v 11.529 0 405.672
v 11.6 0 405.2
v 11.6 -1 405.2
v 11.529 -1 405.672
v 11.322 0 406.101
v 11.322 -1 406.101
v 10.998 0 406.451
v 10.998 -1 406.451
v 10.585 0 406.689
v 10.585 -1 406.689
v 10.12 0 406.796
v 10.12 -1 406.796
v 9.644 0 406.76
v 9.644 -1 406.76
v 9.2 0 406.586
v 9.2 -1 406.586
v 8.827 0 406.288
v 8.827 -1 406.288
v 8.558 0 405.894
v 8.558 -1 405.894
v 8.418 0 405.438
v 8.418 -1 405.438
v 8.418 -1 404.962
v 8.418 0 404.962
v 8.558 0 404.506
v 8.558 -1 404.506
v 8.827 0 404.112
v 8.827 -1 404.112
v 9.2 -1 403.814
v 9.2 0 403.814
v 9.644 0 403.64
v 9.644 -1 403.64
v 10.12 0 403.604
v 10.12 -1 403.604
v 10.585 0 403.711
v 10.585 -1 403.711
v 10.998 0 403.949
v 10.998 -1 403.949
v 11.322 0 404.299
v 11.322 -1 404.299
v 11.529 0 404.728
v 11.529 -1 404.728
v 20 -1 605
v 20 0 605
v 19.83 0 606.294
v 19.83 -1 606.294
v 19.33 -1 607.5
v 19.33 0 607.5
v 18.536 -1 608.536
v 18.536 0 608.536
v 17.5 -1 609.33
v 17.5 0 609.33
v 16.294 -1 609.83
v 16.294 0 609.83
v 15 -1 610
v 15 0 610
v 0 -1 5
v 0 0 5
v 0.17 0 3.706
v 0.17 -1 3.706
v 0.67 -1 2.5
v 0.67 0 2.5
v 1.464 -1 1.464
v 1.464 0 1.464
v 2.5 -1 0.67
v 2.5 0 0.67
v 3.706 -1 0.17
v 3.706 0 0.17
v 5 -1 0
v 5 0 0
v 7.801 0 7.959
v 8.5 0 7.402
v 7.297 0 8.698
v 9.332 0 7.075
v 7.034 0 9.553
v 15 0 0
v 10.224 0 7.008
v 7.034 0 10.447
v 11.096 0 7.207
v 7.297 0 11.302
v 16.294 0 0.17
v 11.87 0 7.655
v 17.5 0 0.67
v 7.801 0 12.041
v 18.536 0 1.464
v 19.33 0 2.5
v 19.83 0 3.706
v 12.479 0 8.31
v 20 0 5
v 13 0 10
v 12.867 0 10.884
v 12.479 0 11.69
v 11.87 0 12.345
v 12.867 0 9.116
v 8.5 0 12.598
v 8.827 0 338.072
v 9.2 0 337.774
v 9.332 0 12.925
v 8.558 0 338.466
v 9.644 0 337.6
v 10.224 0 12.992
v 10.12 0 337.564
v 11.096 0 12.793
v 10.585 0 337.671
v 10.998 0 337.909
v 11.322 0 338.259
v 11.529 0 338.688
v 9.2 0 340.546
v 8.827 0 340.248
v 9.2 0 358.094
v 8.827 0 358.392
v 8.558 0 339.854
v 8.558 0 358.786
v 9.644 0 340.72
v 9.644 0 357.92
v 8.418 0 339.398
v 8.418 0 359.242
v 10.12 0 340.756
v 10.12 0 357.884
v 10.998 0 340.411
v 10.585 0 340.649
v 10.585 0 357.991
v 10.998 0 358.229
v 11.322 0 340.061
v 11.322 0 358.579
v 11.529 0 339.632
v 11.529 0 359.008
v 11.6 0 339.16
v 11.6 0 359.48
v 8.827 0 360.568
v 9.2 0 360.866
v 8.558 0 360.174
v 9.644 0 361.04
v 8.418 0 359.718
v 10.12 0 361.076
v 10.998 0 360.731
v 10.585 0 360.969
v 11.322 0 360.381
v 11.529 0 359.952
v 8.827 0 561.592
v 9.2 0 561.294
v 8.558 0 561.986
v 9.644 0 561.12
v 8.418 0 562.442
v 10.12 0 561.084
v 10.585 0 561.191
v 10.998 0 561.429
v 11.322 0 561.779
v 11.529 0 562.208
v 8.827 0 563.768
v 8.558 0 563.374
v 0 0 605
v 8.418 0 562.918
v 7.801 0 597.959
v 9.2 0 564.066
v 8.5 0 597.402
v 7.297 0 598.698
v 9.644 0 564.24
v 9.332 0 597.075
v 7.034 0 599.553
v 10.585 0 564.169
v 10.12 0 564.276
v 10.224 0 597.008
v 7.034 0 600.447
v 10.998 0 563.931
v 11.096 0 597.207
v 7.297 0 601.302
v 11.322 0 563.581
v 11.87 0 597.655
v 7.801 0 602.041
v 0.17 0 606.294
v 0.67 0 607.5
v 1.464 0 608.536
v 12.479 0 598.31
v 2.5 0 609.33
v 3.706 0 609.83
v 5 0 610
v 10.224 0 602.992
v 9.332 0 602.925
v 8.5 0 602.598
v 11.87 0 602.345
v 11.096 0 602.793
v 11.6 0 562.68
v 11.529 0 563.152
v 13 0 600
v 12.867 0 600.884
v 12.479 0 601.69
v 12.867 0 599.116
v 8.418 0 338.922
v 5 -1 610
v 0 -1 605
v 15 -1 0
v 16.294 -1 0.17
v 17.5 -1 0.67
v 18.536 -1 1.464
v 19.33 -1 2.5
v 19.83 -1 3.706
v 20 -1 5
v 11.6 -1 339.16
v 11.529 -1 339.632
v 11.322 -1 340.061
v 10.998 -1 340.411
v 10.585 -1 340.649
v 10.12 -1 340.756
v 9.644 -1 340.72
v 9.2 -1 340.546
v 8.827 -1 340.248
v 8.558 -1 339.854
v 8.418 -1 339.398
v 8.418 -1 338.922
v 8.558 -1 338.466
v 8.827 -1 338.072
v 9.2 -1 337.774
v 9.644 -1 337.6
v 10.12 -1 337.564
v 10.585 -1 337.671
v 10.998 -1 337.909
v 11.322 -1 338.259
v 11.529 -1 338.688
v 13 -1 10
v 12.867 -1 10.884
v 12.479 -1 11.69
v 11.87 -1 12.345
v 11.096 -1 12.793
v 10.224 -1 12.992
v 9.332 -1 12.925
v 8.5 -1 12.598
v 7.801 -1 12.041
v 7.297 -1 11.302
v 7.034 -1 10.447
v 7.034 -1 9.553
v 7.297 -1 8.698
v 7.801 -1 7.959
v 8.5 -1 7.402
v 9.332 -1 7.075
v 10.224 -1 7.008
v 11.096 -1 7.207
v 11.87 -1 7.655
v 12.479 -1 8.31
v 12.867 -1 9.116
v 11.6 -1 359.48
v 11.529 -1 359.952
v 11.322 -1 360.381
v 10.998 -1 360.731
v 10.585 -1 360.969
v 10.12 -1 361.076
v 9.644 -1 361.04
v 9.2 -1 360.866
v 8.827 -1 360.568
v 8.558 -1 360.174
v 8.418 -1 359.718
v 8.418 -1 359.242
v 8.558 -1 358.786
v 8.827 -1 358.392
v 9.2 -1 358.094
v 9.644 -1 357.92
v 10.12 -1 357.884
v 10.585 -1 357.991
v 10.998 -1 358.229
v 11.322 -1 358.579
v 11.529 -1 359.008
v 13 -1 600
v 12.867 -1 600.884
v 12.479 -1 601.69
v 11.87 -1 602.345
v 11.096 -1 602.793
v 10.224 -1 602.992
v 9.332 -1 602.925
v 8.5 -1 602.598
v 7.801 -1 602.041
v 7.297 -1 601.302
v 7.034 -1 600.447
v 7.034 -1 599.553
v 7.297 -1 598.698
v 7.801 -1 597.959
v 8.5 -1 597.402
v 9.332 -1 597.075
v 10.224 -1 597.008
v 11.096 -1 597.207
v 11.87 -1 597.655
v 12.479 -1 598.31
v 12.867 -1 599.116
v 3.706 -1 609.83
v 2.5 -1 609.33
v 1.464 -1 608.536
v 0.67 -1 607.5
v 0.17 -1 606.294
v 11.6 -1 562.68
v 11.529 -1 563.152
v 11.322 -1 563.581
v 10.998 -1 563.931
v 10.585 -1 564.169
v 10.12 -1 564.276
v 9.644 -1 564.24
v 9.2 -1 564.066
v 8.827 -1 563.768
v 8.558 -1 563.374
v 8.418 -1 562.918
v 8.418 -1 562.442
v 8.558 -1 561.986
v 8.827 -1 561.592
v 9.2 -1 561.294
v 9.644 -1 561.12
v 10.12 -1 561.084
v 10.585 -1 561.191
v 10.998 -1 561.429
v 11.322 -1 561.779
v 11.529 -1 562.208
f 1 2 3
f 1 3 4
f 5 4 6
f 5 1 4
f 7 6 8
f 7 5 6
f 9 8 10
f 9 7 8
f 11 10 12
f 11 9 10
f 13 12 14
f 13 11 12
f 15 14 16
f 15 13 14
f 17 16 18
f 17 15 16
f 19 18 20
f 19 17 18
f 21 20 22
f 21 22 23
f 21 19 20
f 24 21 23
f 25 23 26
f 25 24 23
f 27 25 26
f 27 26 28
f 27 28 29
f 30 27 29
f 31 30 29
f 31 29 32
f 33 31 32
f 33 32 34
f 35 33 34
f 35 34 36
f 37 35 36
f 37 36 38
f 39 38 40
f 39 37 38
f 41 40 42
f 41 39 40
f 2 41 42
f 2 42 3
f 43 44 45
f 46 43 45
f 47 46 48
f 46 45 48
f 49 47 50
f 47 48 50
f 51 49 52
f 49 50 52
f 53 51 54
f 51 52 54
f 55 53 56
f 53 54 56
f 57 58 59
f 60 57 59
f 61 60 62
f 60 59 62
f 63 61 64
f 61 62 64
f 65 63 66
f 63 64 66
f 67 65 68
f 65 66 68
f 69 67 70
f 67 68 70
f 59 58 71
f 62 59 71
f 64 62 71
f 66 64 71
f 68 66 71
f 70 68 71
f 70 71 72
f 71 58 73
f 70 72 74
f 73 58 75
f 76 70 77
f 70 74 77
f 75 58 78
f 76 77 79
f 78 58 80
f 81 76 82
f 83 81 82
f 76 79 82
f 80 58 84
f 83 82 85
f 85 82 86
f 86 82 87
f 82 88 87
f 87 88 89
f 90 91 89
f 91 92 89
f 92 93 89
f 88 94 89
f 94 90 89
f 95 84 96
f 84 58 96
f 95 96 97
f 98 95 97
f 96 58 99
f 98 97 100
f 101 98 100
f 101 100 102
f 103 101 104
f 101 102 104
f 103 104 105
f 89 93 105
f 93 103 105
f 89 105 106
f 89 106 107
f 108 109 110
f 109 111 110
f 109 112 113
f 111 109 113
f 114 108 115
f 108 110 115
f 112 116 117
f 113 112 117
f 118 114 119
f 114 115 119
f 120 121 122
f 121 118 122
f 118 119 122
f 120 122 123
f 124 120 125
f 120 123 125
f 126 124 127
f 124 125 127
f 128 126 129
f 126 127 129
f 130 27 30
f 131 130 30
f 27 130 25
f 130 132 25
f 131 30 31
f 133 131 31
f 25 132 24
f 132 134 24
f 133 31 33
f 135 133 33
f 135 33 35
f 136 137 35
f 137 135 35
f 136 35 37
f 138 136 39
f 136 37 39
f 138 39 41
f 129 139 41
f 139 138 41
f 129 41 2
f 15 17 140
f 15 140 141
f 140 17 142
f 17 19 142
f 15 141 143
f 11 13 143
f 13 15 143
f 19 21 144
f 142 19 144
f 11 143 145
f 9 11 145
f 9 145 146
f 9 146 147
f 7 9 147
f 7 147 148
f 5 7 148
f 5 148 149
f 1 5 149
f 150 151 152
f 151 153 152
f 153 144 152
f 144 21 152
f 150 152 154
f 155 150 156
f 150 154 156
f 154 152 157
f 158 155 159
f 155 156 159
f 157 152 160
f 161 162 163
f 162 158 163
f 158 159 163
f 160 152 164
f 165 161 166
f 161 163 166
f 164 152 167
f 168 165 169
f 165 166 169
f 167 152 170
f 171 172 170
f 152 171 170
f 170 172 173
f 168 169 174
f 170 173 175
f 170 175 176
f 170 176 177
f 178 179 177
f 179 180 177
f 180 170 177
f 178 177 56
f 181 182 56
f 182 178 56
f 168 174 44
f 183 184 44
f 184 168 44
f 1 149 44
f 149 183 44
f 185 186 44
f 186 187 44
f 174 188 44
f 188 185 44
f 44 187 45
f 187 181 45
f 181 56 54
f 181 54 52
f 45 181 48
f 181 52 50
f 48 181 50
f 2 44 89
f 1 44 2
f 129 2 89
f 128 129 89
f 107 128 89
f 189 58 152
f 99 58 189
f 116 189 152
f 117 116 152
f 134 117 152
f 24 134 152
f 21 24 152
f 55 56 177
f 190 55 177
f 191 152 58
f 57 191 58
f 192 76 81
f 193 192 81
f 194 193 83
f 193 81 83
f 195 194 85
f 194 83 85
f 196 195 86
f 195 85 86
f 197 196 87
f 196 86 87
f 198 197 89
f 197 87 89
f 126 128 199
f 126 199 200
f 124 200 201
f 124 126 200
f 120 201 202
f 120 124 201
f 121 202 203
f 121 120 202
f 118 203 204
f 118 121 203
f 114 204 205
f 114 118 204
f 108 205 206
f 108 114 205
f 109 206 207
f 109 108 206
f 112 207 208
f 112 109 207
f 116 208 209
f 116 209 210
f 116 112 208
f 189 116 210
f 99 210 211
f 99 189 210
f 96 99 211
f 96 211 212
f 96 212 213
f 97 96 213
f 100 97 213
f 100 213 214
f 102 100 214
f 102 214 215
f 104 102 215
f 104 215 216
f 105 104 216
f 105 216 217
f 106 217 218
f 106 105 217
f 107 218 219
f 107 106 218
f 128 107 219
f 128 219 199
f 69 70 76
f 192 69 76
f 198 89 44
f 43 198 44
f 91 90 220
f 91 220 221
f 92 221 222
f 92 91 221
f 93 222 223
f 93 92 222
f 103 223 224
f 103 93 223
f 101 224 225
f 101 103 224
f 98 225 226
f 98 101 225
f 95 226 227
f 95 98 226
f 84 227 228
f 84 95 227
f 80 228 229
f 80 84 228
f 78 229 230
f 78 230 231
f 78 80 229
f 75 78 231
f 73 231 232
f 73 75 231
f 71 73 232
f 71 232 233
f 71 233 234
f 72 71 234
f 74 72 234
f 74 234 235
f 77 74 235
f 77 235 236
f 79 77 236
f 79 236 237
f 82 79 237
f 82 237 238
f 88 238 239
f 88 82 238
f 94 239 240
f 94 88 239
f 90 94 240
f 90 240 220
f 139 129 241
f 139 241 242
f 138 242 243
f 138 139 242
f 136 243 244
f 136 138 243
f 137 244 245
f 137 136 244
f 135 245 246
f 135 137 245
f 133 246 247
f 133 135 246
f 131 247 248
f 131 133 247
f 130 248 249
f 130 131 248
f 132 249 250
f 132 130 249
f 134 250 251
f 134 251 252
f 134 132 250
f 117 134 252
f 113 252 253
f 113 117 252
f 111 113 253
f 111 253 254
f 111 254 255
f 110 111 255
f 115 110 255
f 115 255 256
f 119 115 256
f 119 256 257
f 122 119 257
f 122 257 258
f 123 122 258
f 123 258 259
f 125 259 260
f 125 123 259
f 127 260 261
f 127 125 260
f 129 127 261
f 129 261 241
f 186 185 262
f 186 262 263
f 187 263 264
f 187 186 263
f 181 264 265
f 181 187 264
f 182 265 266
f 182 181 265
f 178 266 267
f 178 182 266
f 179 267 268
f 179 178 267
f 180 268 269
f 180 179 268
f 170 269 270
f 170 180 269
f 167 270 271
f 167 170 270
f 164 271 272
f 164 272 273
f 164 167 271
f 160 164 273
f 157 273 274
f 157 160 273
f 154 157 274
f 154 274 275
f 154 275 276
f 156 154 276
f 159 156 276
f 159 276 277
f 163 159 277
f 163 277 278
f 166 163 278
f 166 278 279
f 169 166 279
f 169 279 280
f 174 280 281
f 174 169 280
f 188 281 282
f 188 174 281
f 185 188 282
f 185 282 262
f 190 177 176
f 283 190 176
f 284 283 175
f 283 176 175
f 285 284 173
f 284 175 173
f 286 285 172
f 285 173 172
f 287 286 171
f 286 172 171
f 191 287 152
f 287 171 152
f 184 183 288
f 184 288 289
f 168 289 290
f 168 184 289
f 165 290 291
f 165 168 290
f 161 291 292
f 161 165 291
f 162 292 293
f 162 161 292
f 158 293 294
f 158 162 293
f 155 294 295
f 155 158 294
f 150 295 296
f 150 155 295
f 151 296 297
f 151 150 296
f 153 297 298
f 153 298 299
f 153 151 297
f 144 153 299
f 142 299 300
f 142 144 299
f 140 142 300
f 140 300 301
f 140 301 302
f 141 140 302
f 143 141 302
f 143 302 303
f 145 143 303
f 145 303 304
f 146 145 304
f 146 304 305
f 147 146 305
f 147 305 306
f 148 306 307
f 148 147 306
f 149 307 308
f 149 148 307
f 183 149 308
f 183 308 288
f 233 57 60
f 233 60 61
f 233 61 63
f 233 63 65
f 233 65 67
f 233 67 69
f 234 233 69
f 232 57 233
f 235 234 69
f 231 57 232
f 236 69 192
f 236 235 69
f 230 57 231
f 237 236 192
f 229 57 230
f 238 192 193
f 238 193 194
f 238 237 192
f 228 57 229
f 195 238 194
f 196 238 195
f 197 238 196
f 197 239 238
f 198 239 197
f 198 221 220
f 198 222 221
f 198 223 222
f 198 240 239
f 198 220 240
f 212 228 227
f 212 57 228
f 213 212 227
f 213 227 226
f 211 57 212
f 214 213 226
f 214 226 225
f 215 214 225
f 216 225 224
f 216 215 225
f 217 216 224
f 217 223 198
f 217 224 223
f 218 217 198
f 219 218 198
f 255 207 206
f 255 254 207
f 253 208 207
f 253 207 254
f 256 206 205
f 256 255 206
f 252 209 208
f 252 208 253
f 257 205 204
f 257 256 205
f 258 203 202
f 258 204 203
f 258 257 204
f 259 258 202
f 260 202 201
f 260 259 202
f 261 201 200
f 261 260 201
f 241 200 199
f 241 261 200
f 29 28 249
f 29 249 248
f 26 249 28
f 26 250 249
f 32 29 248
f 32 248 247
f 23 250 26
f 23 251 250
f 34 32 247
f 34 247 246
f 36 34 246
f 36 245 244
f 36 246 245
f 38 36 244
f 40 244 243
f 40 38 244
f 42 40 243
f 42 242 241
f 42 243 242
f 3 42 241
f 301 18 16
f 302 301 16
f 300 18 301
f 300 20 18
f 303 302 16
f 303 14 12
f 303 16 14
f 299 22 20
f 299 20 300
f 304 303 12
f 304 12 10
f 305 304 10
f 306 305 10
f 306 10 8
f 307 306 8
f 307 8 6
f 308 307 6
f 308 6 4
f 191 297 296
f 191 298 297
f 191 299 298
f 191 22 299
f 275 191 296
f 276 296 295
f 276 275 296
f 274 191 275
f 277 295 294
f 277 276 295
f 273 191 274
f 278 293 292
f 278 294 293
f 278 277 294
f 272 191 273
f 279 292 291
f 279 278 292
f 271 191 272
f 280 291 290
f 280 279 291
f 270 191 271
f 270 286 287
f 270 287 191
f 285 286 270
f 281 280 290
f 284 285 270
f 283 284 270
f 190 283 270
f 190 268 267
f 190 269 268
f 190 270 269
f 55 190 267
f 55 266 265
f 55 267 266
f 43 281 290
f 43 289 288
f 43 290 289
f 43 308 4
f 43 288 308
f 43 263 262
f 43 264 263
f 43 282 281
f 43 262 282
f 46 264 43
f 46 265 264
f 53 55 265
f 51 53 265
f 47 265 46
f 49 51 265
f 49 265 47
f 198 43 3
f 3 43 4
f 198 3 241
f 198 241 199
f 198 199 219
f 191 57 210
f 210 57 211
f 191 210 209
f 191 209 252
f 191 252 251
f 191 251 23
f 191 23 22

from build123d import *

# Parameters (mm, degrees)
F0_R     = 3
F0_R_2   = 1.6
F1_DEPTH = 1


with BuildPart() as f1:
    # F0 (on Front) → F1 (new body)
    with BuildSketch(Plane.XZ):
        with BuildLine():
            ThreePointArc((0, 5), (1.464466, 1.464466), (5, 0))
            Line((5, 0), (15, 0))
            ThreePointArc((15, 0), (18.535534, 1.464466), (20, 5))
            Line((20, 5), (20, 605))
            ThreePointArc((20, 605), (18.535534, 608.535534), (15, 610))
            Line((15, 610), (5, 610))
            ThreePointArc((5, 610), (1.464466, 608.535534), (0, 605))
            Line((0, 605), (0, 5))
        make_face()
        with Locations((10, 10)):
            Circle(F0_R, mode=Mode.SUBTRACT)
        with Locations((10, 339.16)):
            Circle(F0_R_2, mode=Mode.SUBTRACT)
        with Locations((10, 359.48)):
            Circle(F0_R_2, mode=Mode.SUBTRACT)
        with Locations((10, 405.2)):
            Circle(F0_R_2, mode=Mode.SUBTRACT)
        with Locations((10, 562.68)):
            Circle(F0_R_2, mode=Mode.SUBTRACT)
        with Locations((10, 600)):
            Circle(F0_R, mode=Mode.SUBTRACT)
    extrude(amount=F1_DEPTH)


solid = f1.part
